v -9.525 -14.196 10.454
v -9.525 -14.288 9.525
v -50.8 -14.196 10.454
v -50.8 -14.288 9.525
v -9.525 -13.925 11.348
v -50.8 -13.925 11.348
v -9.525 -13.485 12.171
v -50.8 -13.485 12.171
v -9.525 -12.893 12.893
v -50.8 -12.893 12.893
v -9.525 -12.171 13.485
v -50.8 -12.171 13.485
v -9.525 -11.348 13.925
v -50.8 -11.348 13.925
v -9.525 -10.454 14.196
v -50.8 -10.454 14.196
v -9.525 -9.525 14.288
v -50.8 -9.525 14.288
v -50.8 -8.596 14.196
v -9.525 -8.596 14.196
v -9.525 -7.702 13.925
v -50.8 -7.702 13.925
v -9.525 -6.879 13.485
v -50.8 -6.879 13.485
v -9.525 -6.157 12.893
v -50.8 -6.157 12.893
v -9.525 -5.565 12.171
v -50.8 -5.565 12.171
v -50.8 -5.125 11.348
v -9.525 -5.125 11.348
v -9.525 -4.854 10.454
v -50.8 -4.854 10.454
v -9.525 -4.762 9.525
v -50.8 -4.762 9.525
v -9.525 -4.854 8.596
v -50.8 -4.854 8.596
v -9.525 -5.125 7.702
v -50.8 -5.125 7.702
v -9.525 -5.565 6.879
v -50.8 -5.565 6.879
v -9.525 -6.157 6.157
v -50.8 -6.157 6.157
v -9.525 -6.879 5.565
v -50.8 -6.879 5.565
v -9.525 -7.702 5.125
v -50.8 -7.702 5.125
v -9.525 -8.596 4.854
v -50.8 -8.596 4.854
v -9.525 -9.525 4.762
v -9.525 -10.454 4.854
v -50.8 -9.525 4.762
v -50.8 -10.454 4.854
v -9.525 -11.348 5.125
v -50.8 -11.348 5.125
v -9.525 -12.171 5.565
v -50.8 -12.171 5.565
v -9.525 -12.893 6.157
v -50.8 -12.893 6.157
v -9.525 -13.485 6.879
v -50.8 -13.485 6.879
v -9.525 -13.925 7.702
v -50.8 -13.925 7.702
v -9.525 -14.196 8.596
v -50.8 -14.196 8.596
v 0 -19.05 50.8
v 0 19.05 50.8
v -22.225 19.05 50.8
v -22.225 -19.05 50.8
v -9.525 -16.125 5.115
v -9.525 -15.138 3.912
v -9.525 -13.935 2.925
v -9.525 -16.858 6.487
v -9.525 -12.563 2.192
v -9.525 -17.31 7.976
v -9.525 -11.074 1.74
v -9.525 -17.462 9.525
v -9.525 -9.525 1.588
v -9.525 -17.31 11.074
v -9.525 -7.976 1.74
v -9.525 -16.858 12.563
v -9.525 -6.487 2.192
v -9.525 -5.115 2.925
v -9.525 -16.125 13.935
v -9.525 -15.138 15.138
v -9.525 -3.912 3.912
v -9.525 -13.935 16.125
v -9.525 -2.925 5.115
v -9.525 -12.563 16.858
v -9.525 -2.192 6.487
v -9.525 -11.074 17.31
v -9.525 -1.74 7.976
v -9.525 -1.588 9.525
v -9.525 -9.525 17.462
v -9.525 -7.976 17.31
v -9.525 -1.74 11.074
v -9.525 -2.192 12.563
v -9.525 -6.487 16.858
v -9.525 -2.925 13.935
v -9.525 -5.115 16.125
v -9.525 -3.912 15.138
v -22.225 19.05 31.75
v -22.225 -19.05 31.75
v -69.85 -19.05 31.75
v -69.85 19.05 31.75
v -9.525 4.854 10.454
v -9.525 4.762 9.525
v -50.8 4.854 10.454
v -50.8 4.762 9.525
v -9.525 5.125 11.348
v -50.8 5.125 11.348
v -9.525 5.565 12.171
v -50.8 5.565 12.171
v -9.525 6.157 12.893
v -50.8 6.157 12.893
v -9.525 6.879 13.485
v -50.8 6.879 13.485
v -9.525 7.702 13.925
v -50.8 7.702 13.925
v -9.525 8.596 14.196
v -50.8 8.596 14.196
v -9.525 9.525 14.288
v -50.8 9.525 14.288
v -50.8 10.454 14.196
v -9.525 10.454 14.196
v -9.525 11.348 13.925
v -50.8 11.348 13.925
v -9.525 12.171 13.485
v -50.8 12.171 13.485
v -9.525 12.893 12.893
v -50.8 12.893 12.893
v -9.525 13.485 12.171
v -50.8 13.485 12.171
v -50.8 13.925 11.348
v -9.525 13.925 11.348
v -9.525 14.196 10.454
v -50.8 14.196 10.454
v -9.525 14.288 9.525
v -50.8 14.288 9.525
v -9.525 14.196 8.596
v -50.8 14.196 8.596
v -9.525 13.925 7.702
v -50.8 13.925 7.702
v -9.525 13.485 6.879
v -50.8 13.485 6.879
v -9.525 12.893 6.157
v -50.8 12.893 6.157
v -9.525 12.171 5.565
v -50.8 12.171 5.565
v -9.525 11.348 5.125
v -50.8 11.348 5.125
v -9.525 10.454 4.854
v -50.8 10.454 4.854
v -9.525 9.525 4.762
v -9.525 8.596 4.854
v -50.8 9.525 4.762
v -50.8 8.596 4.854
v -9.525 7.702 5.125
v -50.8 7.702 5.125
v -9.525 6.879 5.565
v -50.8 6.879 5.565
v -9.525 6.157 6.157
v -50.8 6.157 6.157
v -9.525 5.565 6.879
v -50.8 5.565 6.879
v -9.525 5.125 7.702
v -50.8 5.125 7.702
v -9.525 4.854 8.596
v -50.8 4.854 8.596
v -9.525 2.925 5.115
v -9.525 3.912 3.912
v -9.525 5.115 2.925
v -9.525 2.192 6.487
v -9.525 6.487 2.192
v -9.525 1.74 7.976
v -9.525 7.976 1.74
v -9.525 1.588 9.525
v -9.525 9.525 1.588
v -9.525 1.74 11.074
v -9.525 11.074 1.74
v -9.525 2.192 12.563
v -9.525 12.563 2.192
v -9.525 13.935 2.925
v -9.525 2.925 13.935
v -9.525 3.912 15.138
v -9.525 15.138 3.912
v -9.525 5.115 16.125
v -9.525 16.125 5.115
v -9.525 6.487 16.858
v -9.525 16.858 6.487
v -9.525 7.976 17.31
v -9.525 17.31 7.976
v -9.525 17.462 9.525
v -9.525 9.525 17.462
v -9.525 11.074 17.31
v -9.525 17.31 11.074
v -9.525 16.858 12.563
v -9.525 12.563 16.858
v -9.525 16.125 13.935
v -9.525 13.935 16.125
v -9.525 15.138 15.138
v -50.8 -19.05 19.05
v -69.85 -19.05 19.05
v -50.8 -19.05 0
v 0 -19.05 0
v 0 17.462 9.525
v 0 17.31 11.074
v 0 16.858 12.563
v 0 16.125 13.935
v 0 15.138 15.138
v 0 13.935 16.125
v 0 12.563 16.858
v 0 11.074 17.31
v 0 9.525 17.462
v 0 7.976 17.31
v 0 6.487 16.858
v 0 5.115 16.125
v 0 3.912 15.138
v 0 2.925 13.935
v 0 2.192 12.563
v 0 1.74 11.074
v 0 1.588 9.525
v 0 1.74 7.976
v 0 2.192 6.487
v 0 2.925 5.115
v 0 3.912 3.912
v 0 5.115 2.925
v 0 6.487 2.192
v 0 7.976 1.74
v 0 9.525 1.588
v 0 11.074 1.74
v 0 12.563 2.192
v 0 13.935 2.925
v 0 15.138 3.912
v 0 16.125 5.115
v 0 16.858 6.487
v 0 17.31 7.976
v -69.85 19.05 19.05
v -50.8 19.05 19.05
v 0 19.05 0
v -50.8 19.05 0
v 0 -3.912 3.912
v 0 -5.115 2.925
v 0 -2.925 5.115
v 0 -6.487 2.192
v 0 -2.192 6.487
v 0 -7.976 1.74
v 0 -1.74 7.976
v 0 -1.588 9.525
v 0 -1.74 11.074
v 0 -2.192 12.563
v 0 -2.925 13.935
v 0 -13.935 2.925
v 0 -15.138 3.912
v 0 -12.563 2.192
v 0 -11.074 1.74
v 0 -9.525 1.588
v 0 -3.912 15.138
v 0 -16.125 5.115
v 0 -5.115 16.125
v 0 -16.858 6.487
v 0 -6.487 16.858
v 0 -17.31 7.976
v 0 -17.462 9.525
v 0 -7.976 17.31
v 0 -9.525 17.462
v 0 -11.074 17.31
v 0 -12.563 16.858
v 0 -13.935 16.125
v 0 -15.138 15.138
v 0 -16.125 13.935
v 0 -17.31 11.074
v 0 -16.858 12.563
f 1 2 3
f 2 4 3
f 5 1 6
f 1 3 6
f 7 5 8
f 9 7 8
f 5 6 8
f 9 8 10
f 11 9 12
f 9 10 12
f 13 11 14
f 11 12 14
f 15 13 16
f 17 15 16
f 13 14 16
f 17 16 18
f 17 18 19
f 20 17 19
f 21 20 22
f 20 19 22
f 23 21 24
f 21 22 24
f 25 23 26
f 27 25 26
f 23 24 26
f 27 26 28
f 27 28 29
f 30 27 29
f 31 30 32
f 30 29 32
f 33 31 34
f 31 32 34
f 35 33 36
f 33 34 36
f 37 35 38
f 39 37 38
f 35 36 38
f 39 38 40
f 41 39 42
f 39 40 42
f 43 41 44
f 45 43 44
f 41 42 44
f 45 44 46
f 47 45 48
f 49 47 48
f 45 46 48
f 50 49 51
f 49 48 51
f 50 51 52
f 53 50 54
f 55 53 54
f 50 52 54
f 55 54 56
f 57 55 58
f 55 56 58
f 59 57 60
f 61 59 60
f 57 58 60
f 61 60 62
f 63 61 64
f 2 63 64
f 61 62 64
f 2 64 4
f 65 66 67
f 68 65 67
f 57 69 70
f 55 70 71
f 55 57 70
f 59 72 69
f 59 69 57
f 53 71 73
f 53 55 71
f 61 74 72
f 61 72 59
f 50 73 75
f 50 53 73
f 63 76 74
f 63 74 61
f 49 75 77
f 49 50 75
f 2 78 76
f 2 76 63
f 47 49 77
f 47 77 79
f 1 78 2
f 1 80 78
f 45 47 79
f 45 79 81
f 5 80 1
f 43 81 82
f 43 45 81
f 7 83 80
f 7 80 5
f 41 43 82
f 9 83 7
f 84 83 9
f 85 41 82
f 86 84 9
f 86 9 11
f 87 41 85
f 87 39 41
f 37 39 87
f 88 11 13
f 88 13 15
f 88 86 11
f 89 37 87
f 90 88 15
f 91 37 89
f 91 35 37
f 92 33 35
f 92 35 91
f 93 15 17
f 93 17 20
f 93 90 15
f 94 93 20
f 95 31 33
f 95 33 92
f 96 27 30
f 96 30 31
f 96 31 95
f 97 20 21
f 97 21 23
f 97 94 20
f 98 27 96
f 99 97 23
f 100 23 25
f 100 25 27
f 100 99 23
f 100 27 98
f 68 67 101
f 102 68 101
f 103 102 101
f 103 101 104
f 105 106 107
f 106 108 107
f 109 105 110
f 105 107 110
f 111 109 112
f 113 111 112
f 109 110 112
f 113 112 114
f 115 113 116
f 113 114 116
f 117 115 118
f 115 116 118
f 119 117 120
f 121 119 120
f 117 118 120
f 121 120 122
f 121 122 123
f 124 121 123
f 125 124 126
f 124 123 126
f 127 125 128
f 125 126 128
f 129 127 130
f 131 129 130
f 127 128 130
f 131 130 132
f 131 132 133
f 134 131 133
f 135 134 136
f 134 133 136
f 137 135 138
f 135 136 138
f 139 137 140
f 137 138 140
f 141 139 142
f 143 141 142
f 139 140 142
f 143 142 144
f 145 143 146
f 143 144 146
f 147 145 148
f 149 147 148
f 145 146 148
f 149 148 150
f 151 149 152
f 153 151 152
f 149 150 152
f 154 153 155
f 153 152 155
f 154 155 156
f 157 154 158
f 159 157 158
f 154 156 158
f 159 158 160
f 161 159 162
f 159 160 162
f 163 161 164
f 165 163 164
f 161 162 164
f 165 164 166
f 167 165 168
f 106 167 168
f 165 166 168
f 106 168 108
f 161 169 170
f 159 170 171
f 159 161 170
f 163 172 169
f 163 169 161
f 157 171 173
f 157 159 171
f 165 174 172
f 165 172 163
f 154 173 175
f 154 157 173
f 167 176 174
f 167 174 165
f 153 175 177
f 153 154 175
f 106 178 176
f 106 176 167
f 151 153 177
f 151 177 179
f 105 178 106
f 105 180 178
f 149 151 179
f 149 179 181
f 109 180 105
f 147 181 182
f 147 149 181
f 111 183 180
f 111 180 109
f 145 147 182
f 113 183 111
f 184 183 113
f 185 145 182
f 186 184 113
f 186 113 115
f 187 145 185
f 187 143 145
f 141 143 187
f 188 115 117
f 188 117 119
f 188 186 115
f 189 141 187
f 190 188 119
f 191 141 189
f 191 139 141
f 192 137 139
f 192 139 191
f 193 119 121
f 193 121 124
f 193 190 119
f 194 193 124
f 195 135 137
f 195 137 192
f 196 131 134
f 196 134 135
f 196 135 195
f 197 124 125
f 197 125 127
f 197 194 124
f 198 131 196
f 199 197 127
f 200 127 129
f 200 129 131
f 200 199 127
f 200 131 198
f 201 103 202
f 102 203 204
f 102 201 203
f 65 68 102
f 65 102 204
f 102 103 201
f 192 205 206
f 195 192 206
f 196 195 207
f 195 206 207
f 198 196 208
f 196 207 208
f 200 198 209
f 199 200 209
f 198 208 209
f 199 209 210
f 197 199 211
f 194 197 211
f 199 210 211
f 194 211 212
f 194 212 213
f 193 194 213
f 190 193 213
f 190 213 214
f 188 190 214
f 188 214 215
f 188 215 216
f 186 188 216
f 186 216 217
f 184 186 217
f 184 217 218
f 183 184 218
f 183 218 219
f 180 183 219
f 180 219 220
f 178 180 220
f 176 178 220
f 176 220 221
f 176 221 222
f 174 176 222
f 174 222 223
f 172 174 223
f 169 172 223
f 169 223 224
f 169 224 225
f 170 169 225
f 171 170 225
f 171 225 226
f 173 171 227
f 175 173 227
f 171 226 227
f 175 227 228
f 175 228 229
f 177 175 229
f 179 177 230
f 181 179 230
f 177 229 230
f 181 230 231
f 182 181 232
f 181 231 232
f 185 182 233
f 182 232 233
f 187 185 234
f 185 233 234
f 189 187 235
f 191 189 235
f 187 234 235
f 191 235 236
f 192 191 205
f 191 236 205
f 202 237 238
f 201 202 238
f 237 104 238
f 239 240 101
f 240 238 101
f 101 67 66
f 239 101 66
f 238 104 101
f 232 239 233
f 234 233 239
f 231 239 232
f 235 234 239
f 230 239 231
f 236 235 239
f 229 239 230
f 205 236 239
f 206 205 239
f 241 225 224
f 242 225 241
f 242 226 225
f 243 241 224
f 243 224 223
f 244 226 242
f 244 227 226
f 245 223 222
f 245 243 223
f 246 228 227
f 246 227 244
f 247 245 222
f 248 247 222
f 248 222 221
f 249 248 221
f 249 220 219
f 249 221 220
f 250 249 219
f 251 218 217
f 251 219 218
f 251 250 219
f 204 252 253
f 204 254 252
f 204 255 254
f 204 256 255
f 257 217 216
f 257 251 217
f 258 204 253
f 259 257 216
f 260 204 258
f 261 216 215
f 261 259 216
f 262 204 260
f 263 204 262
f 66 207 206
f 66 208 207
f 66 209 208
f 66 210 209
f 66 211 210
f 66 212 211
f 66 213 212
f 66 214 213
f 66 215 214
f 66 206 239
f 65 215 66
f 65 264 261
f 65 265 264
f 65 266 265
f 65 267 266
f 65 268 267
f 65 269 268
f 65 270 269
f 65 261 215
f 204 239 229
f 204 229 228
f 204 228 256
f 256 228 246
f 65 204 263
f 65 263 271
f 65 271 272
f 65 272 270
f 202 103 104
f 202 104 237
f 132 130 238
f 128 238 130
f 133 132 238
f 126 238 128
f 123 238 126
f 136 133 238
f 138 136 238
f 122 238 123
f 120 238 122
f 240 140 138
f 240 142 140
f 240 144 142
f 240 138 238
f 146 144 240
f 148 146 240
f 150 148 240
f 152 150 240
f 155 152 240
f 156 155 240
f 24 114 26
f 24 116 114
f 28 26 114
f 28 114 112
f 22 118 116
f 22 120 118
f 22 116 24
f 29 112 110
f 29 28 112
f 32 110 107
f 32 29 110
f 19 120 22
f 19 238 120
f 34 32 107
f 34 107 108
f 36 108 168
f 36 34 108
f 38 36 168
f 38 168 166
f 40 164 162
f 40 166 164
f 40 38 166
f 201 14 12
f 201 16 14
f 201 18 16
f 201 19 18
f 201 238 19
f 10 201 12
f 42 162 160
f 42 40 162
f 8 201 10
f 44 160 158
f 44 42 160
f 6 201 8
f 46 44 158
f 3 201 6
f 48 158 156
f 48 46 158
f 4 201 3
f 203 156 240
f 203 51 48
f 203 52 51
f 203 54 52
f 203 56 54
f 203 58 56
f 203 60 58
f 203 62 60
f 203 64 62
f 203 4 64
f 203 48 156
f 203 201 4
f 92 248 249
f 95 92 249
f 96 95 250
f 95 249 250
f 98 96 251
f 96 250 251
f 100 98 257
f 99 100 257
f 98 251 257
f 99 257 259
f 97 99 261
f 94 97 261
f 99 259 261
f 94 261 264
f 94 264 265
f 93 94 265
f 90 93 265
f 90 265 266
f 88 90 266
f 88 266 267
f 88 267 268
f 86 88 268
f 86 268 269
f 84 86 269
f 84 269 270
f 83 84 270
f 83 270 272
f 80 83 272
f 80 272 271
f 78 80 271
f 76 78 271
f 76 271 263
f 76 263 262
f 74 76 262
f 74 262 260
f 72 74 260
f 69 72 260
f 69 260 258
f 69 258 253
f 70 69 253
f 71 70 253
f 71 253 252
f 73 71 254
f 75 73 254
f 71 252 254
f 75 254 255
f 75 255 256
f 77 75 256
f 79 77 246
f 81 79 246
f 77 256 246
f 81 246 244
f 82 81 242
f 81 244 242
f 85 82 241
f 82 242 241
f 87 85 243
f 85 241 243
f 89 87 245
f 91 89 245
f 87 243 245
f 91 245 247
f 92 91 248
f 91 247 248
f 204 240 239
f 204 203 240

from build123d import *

# Parameters (mm, degrees)
F1_DEPTH       = 19.05
F3_D           = 9.525
F3_CBORE_D     = 15.875
F3_CBORE_DEPTH = 9.525


# Not quite as in the source:
# - a length typed as a fraction of an inch, garbled in the dataset ("3 / 203.2 mm" for 3/8 in), is restored


with BuildPart() as f1:
    # F0 (on Front) → F1 (new body, symmetric)
    with BuildSketch(Plane.XZ):
        Polygon((-50.8, 0), (0, 0), (0, 50.8), (-22.225, 50.8), (-22.225, 31.75), (-69.85, 31.75), (-69.85, 19.05), (-50.8, 19.05), align=None)
    extrude(amount=F1_DEPTH, both=True)

    # F3 (through all)
    with Locations(Plane.YZ):
        with Locations((-9.525, 9.525), (9.525, 9.525)):
            CounterBoreHole(F3_D / 2, F3_CBORE_D / 2, F3_CBORE_DEPTH)


solid = f1.part
